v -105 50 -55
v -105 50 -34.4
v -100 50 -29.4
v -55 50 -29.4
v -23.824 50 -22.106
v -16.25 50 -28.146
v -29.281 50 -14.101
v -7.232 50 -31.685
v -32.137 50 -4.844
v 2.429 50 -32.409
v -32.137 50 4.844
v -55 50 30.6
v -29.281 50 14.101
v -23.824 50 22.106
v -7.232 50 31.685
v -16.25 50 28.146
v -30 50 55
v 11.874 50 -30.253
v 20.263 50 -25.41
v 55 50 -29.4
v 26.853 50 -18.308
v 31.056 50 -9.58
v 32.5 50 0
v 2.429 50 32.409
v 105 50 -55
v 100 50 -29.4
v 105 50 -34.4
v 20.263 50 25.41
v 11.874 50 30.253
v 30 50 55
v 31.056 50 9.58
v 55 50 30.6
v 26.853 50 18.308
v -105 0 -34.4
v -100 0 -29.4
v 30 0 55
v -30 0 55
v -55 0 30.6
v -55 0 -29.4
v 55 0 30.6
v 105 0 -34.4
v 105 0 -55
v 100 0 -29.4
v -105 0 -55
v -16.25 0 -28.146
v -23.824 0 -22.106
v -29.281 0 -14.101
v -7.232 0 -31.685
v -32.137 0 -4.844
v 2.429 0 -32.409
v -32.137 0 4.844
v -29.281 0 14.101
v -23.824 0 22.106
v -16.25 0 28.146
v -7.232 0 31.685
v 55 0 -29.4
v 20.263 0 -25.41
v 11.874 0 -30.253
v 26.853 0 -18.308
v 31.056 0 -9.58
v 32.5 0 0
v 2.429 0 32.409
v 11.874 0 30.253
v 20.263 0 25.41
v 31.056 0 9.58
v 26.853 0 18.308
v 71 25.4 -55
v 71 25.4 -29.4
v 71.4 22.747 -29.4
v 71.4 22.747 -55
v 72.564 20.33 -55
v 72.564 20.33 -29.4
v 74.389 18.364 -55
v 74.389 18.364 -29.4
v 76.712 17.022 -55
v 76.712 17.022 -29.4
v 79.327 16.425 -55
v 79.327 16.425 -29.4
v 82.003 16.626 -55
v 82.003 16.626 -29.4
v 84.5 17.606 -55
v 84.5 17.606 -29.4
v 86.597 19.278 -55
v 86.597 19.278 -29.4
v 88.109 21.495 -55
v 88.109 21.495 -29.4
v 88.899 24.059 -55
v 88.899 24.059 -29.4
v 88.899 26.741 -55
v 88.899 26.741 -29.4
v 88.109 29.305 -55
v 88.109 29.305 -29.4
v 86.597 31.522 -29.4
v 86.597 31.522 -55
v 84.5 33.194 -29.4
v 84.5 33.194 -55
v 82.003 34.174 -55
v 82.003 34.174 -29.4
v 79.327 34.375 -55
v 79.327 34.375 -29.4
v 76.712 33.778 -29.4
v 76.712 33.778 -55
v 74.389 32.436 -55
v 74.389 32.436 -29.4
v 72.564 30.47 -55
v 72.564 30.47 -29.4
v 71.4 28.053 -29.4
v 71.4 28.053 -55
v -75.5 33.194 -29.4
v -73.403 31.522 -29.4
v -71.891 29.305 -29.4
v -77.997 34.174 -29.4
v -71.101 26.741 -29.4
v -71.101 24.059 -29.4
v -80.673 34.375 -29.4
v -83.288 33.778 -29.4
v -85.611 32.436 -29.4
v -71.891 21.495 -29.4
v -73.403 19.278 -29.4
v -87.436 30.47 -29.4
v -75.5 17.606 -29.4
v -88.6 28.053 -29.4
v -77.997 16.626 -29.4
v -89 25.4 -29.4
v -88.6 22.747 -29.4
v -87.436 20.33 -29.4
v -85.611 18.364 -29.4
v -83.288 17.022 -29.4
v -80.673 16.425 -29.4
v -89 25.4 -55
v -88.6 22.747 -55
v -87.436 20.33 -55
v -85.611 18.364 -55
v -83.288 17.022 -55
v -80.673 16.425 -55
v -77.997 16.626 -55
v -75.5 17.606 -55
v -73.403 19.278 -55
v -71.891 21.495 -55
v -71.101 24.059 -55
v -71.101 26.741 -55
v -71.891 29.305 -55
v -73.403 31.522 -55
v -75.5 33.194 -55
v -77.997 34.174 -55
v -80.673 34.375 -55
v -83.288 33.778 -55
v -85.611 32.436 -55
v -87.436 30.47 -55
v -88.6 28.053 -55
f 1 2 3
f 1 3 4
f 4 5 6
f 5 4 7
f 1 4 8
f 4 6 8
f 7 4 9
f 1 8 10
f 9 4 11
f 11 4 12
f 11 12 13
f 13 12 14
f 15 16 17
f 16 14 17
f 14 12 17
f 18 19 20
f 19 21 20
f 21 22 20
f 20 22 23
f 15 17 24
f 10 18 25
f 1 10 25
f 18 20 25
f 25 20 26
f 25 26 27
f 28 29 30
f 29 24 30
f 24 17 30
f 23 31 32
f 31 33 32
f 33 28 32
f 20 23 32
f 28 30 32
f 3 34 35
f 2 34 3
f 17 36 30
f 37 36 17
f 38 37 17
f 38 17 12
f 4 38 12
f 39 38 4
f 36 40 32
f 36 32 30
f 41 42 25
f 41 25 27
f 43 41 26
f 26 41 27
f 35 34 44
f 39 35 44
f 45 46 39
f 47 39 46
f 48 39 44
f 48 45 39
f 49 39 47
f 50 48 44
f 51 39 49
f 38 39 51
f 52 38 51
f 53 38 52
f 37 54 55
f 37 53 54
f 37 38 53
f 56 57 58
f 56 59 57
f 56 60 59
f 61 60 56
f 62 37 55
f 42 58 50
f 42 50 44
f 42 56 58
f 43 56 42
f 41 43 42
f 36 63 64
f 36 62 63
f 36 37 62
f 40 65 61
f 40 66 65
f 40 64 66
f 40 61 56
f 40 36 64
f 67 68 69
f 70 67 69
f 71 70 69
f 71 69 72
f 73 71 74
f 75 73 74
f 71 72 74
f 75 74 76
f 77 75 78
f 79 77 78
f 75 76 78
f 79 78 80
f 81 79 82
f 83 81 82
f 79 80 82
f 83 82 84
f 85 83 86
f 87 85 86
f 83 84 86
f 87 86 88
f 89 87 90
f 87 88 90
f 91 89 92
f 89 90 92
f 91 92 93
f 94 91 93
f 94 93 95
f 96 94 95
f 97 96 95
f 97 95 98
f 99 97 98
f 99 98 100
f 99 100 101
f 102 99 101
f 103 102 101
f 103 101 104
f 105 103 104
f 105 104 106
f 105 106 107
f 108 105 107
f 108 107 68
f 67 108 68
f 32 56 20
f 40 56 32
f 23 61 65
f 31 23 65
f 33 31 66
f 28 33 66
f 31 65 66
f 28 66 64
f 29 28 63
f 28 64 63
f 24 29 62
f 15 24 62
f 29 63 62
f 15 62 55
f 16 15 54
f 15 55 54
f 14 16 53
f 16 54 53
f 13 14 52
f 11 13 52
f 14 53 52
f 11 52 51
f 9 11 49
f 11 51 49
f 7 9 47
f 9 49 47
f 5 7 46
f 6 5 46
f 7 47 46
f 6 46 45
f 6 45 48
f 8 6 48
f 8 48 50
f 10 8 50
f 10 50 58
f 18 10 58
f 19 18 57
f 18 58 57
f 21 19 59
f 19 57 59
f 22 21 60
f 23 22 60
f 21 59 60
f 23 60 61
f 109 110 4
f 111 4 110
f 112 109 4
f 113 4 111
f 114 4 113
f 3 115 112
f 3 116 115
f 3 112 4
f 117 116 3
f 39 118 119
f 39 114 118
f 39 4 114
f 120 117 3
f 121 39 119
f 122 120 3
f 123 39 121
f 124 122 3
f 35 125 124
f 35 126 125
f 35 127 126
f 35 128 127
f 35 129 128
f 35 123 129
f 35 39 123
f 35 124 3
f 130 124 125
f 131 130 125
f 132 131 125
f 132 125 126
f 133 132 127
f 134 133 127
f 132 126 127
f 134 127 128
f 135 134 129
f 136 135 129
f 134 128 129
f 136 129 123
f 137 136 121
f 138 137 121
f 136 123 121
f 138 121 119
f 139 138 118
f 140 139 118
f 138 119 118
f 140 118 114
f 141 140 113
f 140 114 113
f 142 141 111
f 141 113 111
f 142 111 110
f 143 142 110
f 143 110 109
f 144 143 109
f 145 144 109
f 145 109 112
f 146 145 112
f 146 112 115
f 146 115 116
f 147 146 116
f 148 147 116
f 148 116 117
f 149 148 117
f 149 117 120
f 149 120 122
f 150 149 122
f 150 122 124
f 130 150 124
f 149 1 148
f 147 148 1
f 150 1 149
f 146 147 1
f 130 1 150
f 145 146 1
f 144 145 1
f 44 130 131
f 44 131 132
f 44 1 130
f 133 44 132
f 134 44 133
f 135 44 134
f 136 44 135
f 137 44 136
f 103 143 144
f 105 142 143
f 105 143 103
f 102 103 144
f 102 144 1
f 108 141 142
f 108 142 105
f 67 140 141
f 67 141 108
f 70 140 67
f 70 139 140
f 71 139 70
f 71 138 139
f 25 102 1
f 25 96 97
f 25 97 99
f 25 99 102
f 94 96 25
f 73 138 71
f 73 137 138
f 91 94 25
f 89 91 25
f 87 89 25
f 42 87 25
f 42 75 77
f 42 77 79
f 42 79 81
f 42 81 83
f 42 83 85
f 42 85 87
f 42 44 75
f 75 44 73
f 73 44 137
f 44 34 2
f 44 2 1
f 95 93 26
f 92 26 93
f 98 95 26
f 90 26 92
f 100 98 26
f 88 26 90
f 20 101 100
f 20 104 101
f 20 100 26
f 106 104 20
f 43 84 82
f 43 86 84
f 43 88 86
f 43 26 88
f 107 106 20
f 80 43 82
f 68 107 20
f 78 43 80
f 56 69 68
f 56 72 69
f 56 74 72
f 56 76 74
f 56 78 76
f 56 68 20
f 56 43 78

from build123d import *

# Parameters (mm, degrees)
F0_R     = 32.5
F1_DEPTH = 50
F2_SIZE  = 5
F4_D     = 18


with BuildPart() as f1:
    # F0 (on Front) → F1 (new body)
    with BuildSketch(Plane.XZ):
        Polygon((30, 55), (0, 55), (-30, 55), (-55, 30.6), (-55, -29.4), (-105, -29.4), (-105, -55), (0, -55), (105, -55), (105, -29.4), (55, -29.4), (55, 30.6), align=None)
        Circle(F0_R, mode=Mode.SUBTRACT)
    extrude(amount=-F1_DEPTH)

    # F2
    f2_edges = [f1.edges().sort_by_distance(p)[0] for p in [
        (105, 25, -29.4),
        (-105, 25, -29.4),
    ]]
    chamfer(f2_edges, length=F2_SIZE)

    # F4 (through all)
    with Locations(Plane(origin=(0, 0, -55), x_dir=(1, 0, 0), z_dir=(0, 0, -1))):
        with Locations((-80, -25.4), (80, -25.4)):
            Hole(F4_D / 2)


solid = f1.part
